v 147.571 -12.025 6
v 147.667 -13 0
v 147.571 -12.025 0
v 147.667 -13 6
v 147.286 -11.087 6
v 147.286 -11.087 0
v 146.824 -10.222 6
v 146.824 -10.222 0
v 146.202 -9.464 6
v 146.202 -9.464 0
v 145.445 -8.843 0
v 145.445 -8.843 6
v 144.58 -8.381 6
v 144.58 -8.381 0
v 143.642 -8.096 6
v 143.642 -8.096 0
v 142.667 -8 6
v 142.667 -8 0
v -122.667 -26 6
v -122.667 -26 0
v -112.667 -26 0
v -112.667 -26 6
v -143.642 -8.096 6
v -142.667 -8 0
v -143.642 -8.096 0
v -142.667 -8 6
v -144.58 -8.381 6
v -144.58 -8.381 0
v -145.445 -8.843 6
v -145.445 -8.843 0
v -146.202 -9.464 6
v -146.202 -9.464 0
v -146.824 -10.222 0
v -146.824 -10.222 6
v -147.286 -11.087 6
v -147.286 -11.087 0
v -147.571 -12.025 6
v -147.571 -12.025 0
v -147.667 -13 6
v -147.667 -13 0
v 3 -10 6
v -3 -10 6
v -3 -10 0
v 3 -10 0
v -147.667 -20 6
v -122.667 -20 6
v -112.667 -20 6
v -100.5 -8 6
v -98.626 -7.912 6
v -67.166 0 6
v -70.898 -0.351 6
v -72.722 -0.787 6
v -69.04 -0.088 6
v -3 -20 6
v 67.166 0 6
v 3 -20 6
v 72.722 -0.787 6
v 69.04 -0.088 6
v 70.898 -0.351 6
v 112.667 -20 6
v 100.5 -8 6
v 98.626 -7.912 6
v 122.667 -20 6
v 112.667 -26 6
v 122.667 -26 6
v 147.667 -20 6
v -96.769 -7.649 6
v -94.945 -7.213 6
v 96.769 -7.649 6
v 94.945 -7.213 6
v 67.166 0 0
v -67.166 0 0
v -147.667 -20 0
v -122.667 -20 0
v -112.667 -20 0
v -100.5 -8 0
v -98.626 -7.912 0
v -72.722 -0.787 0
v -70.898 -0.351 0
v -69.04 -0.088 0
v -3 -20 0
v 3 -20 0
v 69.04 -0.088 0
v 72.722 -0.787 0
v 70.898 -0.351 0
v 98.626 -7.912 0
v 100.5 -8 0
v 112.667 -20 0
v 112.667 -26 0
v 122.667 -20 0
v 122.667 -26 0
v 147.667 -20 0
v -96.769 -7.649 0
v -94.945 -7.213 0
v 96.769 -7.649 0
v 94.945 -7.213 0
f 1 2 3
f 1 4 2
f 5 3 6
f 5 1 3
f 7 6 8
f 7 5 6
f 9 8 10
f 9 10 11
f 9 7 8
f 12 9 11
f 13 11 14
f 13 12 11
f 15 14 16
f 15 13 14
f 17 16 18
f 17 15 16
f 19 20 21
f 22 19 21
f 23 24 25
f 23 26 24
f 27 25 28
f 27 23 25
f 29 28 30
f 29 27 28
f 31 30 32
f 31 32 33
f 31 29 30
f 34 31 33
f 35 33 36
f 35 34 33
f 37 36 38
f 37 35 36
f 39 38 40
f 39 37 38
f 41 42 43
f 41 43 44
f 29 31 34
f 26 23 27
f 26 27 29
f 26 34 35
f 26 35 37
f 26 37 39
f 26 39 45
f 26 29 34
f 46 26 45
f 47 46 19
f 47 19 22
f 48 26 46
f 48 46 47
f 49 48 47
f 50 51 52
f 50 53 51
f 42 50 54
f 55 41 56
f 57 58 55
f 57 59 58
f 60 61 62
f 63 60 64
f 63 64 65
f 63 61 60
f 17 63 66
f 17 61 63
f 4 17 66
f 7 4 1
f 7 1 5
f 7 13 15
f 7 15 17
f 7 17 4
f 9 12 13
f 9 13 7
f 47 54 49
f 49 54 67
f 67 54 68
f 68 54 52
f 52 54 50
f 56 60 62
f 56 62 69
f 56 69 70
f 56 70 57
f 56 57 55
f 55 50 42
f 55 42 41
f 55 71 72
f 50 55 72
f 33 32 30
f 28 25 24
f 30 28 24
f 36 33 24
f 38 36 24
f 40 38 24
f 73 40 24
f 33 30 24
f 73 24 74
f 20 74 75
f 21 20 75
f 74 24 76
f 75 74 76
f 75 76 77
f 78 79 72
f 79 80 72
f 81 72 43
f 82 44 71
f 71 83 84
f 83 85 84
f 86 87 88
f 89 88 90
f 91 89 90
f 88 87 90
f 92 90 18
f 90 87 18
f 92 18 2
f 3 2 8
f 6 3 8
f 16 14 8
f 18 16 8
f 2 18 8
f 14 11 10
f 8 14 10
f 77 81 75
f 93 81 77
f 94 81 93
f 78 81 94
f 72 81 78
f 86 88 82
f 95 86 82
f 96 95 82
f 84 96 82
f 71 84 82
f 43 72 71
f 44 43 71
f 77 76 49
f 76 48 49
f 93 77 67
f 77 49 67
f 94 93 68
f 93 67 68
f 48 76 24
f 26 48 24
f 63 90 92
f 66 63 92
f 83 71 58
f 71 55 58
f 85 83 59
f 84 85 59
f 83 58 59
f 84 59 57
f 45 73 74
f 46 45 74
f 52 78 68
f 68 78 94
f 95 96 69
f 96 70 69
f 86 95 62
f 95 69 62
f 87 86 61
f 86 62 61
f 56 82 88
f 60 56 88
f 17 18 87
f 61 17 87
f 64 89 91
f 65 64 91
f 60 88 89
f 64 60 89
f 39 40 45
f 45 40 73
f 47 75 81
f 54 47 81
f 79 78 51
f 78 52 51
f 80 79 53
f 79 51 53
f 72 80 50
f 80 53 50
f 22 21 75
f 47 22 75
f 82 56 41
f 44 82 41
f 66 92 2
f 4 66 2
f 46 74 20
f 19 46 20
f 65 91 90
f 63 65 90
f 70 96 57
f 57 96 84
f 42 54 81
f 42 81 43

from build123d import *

# Parameters (mm, degrees)
BOSS_EXTRUDE1_DEPTH     = 6
FILLET1_R               = 5
FILLET2_R               = 20
SKETCH2_W               = 6
SKETCH2_H               = 10
CUT_EXTRUDE1_DEPTH      = 1
CUT_EXTRUDE1_DEPTH_BACK = 7


with BuildPart() as part:
    # Sketch1 → Boss-Extrude1 (new body)
    with BuildSketch(Plane.XY):
        Polygon((70, 0), (-70, 0), (-97.66666667, -8), (-147.66666667, -8), (-147.66666667, -20), (-122.66666667, -20), (-122.66666667, -26), (-112.66666667, -26), (-112.66666667, -20), (112.66666667, -20), (112.66666667, -26), (122.66666667, -26), (122.66666667, -20), (147.66666667, -20), (147.66666667, -8), (97.66666667, -8), align=None)
    extrude(amount=BOSS_EXTRUDE1_DEPTH)

    # Fillet1
    fillet1_edges = [part.edges().sort_by_distance(p)[0] for p in [
        (-147.66666667, -8, 3),
        (147.66666667, -8, 3),
    ]]
    fillet(fillet1_edges, radius=FILLET1_R)

    # Fillet2
    fillet2_edges = [part.edges().sort_by_distance(p)[0] for p in [
        (-97.66666667, -8, 3),
        (-70, 0, 3),
        (70, 0, 3),
        (97.66666667, -8, 3),
    ]]
    fillet(fillet2_edges, radius=FILLET2_R)

    # Sketch2 → Cut-Extrude1 (cut, two sides)
    with BuildSketch(Plane.XY.offset(6)) as cut_extrude1_sk:
        with Locations((0, -15)):
            Rectangle(SKETCH2_W, SKETCH2_H)
    extrude(amount=CUT_EXTRUDE1_DEPTH, mode=Mode.SUBTRACT)
    extrude(cut_extrude1_sk.sketch, amount=-CUT_EXTRUDE1_DEPTH_BACK, mode=Mode.SUBTRACT)


solid = part.part
